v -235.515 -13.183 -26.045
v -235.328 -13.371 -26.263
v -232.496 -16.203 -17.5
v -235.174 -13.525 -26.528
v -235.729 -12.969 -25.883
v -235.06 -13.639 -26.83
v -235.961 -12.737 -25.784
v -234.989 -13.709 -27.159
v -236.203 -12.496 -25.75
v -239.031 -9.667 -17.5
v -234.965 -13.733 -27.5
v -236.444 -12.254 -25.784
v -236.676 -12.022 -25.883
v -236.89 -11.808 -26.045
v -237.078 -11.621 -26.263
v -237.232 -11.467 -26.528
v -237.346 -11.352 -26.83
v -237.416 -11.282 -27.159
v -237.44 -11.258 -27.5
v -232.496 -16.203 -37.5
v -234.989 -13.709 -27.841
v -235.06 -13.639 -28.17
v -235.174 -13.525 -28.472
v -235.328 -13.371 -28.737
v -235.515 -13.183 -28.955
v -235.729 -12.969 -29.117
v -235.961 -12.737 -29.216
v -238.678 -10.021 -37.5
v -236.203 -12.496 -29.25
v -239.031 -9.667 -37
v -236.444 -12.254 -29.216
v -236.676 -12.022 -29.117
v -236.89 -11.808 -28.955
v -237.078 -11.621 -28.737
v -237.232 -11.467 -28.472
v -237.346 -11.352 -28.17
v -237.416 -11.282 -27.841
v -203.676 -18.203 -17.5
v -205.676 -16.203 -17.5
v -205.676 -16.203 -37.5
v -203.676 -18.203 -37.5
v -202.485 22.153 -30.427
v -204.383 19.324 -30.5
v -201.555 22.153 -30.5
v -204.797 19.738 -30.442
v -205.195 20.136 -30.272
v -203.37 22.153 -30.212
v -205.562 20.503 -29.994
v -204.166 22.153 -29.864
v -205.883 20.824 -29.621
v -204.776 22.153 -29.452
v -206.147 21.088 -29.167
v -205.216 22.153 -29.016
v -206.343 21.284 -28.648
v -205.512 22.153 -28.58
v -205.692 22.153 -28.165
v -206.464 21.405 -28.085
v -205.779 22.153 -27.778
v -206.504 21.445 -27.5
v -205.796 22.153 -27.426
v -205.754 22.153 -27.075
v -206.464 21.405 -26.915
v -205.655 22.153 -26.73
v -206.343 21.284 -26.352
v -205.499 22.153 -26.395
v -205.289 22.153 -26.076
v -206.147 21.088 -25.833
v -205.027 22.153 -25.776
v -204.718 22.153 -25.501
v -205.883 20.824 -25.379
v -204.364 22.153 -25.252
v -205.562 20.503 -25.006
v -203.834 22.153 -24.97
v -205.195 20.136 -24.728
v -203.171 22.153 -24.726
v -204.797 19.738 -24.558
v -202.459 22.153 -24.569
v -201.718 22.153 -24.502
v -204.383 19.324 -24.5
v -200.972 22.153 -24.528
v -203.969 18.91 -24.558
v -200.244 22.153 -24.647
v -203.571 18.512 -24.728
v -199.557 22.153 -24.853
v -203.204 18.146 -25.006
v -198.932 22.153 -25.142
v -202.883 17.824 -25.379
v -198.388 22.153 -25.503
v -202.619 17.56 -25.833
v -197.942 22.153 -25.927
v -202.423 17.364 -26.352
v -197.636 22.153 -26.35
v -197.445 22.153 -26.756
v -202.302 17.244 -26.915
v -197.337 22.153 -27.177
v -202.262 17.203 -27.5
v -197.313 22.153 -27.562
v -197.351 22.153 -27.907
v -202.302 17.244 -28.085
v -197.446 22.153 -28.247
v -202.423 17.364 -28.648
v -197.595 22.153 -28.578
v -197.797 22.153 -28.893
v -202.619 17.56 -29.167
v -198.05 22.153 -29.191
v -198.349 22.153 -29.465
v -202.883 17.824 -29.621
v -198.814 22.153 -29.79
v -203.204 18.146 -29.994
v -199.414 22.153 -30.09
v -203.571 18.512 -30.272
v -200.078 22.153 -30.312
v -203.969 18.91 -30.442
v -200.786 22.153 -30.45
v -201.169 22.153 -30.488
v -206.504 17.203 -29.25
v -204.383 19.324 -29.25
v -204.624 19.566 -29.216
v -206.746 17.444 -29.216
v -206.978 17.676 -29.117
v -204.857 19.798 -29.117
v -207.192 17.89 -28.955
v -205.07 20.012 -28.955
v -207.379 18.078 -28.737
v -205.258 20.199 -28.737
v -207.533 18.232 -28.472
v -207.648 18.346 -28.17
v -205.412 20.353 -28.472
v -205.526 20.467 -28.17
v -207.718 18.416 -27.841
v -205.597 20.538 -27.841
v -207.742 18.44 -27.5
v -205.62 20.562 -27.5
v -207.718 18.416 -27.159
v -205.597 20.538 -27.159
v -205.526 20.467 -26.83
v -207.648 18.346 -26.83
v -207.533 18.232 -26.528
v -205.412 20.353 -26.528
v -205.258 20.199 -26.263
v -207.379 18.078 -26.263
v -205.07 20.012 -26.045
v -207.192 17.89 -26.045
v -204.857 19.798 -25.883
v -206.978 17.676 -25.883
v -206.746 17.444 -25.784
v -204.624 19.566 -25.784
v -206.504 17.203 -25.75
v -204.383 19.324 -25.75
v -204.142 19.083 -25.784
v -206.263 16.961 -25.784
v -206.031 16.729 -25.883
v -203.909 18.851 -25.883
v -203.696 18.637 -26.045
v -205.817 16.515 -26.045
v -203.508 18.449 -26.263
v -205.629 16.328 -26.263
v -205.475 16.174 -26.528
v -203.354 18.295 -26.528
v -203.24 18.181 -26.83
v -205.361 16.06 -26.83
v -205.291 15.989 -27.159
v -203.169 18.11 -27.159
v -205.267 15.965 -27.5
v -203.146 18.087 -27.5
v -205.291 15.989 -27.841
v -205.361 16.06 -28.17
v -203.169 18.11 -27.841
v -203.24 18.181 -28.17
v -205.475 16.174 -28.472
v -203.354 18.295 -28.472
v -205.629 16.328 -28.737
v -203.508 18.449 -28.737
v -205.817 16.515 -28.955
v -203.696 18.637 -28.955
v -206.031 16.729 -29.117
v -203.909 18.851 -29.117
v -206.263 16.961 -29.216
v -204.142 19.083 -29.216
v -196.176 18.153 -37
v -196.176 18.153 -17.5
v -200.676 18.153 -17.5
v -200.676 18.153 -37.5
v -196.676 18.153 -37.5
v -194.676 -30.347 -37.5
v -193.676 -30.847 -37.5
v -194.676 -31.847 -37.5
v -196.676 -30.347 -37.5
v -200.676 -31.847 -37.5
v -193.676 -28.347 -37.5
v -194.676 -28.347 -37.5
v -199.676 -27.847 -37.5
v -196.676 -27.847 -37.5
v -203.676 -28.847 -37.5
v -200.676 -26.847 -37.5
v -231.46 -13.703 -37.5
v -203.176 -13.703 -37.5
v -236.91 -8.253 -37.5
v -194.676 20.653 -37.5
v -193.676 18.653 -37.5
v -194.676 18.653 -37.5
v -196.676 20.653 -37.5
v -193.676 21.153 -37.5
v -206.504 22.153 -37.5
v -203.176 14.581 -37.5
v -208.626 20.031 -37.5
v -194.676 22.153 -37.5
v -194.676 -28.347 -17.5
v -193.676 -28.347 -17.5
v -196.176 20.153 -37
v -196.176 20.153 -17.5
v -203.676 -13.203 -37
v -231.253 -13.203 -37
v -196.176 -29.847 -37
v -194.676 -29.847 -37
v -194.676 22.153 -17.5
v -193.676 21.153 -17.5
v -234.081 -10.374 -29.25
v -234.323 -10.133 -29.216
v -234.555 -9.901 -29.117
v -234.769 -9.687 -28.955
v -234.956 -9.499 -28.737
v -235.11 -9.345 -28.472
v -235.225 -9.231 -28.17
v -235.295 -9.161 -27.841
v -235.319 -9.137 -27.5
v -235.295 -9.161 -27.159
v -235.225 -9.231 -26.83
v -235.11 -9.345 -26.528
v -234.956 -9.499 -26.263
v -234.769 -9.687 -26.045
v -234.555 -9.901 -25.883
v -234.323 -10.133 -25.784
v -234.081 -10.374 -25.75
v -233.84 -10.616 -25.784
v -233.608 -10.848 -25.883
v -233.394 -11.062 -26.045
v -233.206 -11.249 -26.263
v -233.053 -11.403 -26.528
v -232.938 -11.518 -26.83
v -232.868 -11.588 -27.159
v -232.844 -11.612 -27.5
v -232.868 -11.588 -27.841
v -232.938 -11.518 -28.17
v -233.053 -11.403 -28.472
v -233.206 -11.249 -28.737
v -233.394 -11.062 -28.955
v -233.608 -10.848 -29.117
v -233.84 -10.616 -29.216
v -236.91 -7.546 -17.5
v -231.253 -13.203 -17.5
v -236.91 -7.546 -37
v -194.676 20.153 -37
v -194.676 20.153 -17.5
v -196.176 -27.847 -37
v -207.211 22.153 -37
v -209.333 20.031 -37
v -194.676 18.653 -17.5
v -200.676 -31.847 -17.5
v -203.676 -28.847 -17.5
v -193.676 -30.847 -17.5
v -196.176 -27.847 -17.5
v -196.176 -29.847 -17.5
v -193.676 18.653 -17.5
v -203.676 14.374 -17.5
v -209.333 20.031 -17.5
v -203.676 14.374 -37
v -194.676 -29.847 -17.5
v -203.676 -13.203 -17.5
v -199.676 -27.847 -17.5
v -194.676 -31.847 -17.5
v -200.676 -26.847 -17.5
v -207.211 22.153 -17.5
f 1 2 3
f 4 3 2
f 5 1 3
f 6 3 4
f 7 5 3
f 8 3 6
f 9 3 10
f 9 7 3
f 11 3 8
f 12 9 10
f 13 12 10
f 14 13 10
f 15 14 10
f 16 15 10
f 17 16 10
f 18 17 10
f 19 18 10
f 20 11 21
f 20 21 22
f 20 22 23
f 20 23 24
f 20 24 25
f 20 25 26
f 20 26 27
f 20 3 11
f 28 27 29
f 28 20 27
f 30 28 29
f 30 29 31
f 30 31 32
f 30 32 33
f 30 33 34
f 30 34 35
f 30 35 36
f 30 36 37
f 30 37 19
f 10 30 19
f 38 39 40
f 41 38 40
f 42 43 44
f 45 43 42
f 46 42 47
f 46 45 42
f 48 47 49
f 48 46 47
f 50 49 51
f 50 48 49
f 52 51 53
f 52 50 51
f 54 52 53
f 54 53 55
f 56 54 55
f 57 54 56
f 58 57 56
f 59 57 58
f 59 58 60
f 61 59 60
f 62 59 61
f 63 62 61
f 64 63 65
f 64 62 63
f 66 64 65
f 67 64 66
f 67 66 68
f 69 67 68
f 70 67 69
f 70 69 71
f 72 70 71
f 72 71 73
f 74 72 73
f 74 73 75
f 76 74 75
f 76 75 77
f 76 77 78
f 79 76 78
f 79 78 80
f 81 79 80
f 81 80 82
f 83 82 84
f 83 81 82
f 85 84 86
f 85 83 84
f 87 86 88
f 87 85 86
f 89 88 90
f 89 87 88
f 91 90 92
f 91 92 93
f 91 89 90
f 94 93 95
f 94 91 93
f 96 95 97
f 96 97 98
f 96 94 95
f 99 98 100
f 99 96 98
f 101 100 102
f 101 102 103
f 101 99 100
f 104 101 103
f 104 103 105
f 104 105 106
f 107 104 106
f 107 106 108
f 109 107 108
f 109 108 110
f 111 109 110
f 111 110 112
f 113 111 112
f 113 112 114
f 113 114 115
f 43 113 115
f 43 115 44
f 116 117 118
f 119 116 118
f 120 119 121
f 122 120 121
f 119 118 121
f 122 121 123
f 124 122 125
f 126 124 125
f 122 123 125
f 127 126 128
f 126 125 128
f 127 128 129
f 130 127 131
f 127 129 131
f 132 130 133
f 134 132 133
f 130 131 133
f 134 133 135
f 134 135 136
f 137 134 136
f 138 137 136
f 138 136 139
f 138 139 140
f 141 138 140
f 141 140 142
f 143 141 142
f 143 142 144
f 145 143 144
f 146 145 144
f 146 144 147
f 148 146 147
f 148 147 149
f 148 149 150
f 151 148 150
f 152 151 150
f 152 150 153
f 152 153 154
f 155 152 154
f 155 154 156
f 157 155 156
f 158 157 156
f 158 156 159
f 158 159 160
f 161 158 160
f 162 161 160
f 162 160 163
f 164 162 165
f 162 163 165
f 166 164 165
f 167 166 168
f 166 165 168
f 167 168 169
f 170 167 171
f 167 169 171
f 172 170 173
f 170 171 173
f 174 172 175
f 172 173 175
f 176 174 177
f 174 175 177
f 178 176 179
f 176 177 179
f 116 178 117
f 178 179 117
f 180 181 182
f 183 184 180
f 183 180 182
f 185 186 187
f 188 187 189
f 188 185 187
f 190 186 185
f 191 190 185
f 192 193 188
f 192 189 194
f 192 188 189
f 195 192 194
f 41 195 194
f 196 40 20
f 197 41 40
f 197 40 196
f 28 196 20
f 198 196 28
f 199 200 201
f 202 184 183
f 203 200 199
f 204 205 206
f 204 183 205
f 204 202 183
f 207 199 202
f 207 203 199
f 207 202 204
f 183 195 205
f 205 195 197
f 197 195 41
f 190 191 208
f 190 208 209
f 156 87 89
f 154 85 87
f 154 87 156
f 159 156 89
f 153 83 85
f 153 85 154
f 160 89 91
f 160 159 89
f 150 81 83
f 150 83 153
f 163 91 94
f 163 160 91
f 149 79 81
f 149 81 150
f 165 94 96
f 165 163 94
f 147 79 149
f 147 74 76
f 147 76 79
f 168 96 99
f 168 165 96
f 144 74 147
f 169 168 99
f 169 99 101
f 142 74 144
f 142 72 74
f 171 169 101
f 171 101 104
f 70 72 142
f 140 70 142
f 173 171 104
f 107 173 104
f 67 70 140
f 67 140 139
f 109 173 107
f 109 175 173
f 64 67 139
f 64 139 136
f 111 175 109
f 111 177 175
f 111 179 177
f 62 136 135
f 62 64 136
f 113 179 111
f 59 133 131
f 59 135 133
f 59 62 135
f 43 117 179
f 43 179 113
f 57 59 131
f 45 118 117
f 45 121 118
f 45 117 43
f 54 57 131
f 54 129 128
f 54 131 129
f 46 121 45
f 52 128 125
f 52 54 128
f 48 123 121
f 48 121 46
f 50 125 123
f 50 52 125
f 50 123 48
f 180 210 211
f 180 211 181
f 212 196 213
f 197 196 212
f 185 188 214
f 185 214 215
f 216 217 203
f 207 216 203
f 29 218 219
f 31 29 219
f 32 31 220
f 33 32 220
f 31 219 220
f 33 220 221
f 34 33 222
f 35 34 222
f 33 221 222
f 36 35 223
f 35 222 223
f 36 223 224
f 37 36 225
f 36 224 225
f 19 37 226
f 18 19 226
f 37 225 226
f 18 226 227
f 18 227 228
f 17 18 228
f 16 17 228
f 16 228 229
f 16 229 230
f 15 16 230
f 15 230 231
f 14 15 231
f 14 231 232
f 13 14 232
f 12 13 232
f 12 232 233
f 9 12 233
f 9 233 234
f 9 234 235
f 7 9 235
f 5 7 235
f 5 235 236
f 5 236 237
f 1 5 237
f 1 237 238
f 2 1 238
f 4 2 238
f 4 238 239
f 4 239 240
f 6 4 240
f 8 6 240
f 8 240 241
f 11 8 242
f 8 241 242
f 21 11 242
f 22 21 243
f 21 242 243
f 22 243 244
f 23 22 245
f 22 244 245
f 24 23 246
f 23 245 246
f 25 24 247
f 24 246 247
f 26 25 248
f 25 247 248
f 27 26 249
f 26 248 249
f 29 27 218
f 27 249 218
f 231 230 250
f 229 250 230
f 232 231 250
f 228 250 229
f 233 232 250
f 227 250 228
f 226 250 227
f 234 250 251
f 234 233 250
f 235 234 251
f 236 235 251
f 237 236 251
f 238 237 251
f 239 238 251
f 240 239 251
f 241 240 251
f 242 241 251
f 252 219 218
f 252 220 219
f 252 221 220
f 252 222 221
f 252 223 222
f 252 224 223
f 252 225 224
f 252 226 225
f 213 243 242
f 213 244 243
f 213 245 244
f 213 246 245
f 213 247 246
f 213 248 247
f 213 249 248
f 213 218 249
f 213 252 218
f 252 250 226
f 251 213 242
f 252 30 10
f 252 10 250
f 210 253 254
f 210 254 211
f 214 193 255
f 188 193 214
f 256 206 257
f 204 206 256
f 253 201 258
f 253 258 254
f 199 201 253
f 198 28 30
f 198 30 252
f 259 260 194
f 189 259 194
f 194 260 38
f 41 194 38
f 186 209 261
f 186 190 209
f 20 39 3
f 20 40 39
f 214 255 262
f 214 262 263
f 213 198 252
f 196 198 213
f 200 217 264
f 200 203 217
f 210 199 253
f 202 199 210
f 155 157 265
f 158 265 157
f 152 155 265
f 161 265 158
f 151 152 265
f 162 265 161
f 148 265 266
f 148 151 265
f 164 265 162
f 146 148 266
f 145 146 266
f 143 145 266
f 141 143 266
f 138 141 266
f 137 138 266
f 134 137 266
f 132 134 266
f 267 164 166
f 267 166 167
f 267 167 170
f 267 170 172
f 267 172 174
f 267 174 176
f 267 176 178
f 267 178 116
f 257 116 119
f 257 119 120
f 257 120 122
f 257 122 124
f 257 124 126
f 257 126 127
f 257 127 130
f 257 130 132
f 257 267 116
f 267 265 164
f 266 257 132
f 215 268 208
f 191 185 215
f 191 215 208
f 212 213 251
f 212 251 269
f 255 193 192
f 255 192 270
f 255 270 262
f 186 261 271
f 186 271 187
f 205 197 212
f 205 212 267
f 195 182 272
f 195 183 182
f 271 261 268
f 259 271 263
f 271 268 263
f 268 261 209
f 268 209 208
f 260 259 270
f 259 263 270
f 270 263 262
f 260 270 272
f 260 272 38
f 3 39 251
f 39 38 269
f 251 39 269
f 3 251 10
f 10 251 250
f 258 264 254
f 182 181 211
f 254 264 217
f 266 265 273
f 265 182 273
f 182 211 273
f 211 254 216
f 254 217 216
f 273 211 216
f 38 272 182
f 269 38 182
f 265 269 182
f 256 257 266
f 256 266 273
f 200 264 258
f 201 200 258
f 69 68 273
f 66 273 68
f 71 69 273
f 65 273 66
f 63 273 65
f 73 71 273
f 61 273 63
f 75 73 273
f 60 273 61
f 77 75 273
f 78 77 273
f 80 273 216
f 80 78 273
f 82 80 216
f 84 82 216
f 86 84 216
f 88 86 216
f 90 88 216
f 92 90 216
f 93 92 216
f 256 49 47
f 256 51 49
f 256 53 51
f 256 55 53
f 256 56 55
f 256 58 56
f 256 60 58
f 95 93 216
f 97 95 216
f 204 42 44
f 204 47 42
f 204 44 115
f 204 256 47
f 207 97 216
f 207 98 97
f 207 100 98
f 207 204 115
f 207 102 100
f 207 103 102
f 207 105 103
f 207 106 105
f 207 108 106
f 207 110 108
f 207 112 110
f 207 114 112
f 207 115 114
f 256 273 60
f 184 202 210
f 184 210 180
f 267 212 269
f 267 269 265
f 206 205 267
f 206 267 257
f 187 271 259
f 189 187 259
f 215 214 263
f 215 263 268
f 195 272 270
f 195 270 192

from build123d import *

# Parameters (mm, degrees)
CYLINDER004_R            = 3
CYLINDER004_DEPTH        = 10
PAD010_DEPTH             = 10
SKETCH036_R              = 1.75
POCKET025_DEPTH          = 45.001
CHAMFER023_1_SIZE        = 3
CHAMFER023_2_SIZE        = 2
CHAMFER023_3_SIZE        = 1
CHAMFER024_SIZE          = 0.5
CLONE007_PITCH_ANGLE     = 90
CLONE007_PLACEMENT_ANGLE = 45


with BuildPart() as boardbracketscrewheadcylinder001:
    # Cylinder004 → Cylinder004 (new body)
    with BuildSketch(Plane(origin=(0, 0.5, 24), x_dir=(1, 0, 0), z_dir=(0, 0, 1))):
        Circle(CYLINDER004_R)
    extrude(amount=CYLINDER004_DEPTH)


with BuildPart() as clone007:
    # Sketch035 → Pad010 (new body, symmetric)
    with BuildSketch(Plane.YZ):
        Polygon((4.5, 21), (4.5, 24), (-0.12132, 28.62132), (-5.071068, 33.571068), (-7.545942, 31.096194), (-6.838835, 30.389087), (-5.778175, 31.449747), (-4.717514, 30.389087), (-6.131728, 28.974874), (-2.949747, 25.792893), (-35.476659, -6.734019), (-38.65864, -3.552038), (-40.072853, -4.966252), (-41.133514, -3.905592), (-40.072853, -2.844931), (-40.77996, -2.137825), (-43.254834, -4.612698), (-38.305087, -9.562446), (-36.183766, -11.683766), (-25.12132, -0.62132), (-4.742641, -21), (4.5, -21), (4.5, -18), (-3.5, -18), (-23, 1.5), (-3.5, 21), align=None)
    extrude(amount=PAD010_DEPTH, both=True)

    # Cut002: cut BoardBracketScrewHeadCylinder001
    add(boardbracketscrewheadcylinder001.part, mode=Mode.SUBTRACT)

    # Sketch036 → Pocket025 (cut, through all)
    with BuildSketch(Plane.XY.offset(24)):
        with Locations((0, 0.5)):
            Circle(SKETCH036_R)
    extrude(amount=-POCKET025_DEPTH, mode=Mode.SUBTRACT)

    # Chamfer023 1
    chamfer023_1_edges = [clone007.edges().sort_by_distance(p)[0] for p in [
        (0, -36.183766, -11.683766),
    ]]
    chamfer(chamfer023_1_edges, length=CHAMFER023_1_SIZE)

    # Chamfer023 2
    chamfer023_2_edges = [clone007.edges().sort_by_distance(p)[0] for p in [
        (0, -25.12132, -0.62132),
    ]]
    chamfer(chamfer023_2_edges, length=CHAMFER023_2_SIZE)

    # Chamfer023 3
    chamfer023_3_edges = [clone007.edges().sort_by_distance(p)[0] for p in [
        (0, -35.476659, -6.734019),
        (0, -43.254834, -4.612698),
        (0, -5.071068, 33.571068),
    ]]
    chamfer(chamfer023_3_edges, length=CHAMFER023_3_SIZE)

    # Chamfer024
    chamfer024_edges = [clone007.edges().sort_by_distance(p)[0] for p in [
        (10, -5.424621, 29.681981),
        (10, -39.365747, -4.259145),
        (10, -5.247845, 30.919417),
        (10, -40.603184, -4.435922),
        (10, 4.5, 22.5),
        (10, 0.5, 21),
        (10, -13.25, 11.25),
        (10, -13.25, -8.25),
        (10, 0.5, -18),
        (10, 4.5, -19.5),
    ]]
    chamfer(chamfer024_edges, length=CHAMFER024_SIZE)


with BuildPart() as clone007_1:
    # Clone007 pitch: moved
    add(clone007.part.rotate(Axis((0, 0, 0), (0, 1, 0)), CLONE007_PITCH_ANGLE))


with BuildPart() as clone007_2:
    # Clone007 placement: moved
    add(clone007_1.part.moved(Location((-220.999994, 1.999983, -27.49999))).rotate(Axis((-220.999994, 1.999983, -27.49999), (0, 0, 1)), CLONE007_PLACEMENT_ANGLE))


solid = clone007_2.part
